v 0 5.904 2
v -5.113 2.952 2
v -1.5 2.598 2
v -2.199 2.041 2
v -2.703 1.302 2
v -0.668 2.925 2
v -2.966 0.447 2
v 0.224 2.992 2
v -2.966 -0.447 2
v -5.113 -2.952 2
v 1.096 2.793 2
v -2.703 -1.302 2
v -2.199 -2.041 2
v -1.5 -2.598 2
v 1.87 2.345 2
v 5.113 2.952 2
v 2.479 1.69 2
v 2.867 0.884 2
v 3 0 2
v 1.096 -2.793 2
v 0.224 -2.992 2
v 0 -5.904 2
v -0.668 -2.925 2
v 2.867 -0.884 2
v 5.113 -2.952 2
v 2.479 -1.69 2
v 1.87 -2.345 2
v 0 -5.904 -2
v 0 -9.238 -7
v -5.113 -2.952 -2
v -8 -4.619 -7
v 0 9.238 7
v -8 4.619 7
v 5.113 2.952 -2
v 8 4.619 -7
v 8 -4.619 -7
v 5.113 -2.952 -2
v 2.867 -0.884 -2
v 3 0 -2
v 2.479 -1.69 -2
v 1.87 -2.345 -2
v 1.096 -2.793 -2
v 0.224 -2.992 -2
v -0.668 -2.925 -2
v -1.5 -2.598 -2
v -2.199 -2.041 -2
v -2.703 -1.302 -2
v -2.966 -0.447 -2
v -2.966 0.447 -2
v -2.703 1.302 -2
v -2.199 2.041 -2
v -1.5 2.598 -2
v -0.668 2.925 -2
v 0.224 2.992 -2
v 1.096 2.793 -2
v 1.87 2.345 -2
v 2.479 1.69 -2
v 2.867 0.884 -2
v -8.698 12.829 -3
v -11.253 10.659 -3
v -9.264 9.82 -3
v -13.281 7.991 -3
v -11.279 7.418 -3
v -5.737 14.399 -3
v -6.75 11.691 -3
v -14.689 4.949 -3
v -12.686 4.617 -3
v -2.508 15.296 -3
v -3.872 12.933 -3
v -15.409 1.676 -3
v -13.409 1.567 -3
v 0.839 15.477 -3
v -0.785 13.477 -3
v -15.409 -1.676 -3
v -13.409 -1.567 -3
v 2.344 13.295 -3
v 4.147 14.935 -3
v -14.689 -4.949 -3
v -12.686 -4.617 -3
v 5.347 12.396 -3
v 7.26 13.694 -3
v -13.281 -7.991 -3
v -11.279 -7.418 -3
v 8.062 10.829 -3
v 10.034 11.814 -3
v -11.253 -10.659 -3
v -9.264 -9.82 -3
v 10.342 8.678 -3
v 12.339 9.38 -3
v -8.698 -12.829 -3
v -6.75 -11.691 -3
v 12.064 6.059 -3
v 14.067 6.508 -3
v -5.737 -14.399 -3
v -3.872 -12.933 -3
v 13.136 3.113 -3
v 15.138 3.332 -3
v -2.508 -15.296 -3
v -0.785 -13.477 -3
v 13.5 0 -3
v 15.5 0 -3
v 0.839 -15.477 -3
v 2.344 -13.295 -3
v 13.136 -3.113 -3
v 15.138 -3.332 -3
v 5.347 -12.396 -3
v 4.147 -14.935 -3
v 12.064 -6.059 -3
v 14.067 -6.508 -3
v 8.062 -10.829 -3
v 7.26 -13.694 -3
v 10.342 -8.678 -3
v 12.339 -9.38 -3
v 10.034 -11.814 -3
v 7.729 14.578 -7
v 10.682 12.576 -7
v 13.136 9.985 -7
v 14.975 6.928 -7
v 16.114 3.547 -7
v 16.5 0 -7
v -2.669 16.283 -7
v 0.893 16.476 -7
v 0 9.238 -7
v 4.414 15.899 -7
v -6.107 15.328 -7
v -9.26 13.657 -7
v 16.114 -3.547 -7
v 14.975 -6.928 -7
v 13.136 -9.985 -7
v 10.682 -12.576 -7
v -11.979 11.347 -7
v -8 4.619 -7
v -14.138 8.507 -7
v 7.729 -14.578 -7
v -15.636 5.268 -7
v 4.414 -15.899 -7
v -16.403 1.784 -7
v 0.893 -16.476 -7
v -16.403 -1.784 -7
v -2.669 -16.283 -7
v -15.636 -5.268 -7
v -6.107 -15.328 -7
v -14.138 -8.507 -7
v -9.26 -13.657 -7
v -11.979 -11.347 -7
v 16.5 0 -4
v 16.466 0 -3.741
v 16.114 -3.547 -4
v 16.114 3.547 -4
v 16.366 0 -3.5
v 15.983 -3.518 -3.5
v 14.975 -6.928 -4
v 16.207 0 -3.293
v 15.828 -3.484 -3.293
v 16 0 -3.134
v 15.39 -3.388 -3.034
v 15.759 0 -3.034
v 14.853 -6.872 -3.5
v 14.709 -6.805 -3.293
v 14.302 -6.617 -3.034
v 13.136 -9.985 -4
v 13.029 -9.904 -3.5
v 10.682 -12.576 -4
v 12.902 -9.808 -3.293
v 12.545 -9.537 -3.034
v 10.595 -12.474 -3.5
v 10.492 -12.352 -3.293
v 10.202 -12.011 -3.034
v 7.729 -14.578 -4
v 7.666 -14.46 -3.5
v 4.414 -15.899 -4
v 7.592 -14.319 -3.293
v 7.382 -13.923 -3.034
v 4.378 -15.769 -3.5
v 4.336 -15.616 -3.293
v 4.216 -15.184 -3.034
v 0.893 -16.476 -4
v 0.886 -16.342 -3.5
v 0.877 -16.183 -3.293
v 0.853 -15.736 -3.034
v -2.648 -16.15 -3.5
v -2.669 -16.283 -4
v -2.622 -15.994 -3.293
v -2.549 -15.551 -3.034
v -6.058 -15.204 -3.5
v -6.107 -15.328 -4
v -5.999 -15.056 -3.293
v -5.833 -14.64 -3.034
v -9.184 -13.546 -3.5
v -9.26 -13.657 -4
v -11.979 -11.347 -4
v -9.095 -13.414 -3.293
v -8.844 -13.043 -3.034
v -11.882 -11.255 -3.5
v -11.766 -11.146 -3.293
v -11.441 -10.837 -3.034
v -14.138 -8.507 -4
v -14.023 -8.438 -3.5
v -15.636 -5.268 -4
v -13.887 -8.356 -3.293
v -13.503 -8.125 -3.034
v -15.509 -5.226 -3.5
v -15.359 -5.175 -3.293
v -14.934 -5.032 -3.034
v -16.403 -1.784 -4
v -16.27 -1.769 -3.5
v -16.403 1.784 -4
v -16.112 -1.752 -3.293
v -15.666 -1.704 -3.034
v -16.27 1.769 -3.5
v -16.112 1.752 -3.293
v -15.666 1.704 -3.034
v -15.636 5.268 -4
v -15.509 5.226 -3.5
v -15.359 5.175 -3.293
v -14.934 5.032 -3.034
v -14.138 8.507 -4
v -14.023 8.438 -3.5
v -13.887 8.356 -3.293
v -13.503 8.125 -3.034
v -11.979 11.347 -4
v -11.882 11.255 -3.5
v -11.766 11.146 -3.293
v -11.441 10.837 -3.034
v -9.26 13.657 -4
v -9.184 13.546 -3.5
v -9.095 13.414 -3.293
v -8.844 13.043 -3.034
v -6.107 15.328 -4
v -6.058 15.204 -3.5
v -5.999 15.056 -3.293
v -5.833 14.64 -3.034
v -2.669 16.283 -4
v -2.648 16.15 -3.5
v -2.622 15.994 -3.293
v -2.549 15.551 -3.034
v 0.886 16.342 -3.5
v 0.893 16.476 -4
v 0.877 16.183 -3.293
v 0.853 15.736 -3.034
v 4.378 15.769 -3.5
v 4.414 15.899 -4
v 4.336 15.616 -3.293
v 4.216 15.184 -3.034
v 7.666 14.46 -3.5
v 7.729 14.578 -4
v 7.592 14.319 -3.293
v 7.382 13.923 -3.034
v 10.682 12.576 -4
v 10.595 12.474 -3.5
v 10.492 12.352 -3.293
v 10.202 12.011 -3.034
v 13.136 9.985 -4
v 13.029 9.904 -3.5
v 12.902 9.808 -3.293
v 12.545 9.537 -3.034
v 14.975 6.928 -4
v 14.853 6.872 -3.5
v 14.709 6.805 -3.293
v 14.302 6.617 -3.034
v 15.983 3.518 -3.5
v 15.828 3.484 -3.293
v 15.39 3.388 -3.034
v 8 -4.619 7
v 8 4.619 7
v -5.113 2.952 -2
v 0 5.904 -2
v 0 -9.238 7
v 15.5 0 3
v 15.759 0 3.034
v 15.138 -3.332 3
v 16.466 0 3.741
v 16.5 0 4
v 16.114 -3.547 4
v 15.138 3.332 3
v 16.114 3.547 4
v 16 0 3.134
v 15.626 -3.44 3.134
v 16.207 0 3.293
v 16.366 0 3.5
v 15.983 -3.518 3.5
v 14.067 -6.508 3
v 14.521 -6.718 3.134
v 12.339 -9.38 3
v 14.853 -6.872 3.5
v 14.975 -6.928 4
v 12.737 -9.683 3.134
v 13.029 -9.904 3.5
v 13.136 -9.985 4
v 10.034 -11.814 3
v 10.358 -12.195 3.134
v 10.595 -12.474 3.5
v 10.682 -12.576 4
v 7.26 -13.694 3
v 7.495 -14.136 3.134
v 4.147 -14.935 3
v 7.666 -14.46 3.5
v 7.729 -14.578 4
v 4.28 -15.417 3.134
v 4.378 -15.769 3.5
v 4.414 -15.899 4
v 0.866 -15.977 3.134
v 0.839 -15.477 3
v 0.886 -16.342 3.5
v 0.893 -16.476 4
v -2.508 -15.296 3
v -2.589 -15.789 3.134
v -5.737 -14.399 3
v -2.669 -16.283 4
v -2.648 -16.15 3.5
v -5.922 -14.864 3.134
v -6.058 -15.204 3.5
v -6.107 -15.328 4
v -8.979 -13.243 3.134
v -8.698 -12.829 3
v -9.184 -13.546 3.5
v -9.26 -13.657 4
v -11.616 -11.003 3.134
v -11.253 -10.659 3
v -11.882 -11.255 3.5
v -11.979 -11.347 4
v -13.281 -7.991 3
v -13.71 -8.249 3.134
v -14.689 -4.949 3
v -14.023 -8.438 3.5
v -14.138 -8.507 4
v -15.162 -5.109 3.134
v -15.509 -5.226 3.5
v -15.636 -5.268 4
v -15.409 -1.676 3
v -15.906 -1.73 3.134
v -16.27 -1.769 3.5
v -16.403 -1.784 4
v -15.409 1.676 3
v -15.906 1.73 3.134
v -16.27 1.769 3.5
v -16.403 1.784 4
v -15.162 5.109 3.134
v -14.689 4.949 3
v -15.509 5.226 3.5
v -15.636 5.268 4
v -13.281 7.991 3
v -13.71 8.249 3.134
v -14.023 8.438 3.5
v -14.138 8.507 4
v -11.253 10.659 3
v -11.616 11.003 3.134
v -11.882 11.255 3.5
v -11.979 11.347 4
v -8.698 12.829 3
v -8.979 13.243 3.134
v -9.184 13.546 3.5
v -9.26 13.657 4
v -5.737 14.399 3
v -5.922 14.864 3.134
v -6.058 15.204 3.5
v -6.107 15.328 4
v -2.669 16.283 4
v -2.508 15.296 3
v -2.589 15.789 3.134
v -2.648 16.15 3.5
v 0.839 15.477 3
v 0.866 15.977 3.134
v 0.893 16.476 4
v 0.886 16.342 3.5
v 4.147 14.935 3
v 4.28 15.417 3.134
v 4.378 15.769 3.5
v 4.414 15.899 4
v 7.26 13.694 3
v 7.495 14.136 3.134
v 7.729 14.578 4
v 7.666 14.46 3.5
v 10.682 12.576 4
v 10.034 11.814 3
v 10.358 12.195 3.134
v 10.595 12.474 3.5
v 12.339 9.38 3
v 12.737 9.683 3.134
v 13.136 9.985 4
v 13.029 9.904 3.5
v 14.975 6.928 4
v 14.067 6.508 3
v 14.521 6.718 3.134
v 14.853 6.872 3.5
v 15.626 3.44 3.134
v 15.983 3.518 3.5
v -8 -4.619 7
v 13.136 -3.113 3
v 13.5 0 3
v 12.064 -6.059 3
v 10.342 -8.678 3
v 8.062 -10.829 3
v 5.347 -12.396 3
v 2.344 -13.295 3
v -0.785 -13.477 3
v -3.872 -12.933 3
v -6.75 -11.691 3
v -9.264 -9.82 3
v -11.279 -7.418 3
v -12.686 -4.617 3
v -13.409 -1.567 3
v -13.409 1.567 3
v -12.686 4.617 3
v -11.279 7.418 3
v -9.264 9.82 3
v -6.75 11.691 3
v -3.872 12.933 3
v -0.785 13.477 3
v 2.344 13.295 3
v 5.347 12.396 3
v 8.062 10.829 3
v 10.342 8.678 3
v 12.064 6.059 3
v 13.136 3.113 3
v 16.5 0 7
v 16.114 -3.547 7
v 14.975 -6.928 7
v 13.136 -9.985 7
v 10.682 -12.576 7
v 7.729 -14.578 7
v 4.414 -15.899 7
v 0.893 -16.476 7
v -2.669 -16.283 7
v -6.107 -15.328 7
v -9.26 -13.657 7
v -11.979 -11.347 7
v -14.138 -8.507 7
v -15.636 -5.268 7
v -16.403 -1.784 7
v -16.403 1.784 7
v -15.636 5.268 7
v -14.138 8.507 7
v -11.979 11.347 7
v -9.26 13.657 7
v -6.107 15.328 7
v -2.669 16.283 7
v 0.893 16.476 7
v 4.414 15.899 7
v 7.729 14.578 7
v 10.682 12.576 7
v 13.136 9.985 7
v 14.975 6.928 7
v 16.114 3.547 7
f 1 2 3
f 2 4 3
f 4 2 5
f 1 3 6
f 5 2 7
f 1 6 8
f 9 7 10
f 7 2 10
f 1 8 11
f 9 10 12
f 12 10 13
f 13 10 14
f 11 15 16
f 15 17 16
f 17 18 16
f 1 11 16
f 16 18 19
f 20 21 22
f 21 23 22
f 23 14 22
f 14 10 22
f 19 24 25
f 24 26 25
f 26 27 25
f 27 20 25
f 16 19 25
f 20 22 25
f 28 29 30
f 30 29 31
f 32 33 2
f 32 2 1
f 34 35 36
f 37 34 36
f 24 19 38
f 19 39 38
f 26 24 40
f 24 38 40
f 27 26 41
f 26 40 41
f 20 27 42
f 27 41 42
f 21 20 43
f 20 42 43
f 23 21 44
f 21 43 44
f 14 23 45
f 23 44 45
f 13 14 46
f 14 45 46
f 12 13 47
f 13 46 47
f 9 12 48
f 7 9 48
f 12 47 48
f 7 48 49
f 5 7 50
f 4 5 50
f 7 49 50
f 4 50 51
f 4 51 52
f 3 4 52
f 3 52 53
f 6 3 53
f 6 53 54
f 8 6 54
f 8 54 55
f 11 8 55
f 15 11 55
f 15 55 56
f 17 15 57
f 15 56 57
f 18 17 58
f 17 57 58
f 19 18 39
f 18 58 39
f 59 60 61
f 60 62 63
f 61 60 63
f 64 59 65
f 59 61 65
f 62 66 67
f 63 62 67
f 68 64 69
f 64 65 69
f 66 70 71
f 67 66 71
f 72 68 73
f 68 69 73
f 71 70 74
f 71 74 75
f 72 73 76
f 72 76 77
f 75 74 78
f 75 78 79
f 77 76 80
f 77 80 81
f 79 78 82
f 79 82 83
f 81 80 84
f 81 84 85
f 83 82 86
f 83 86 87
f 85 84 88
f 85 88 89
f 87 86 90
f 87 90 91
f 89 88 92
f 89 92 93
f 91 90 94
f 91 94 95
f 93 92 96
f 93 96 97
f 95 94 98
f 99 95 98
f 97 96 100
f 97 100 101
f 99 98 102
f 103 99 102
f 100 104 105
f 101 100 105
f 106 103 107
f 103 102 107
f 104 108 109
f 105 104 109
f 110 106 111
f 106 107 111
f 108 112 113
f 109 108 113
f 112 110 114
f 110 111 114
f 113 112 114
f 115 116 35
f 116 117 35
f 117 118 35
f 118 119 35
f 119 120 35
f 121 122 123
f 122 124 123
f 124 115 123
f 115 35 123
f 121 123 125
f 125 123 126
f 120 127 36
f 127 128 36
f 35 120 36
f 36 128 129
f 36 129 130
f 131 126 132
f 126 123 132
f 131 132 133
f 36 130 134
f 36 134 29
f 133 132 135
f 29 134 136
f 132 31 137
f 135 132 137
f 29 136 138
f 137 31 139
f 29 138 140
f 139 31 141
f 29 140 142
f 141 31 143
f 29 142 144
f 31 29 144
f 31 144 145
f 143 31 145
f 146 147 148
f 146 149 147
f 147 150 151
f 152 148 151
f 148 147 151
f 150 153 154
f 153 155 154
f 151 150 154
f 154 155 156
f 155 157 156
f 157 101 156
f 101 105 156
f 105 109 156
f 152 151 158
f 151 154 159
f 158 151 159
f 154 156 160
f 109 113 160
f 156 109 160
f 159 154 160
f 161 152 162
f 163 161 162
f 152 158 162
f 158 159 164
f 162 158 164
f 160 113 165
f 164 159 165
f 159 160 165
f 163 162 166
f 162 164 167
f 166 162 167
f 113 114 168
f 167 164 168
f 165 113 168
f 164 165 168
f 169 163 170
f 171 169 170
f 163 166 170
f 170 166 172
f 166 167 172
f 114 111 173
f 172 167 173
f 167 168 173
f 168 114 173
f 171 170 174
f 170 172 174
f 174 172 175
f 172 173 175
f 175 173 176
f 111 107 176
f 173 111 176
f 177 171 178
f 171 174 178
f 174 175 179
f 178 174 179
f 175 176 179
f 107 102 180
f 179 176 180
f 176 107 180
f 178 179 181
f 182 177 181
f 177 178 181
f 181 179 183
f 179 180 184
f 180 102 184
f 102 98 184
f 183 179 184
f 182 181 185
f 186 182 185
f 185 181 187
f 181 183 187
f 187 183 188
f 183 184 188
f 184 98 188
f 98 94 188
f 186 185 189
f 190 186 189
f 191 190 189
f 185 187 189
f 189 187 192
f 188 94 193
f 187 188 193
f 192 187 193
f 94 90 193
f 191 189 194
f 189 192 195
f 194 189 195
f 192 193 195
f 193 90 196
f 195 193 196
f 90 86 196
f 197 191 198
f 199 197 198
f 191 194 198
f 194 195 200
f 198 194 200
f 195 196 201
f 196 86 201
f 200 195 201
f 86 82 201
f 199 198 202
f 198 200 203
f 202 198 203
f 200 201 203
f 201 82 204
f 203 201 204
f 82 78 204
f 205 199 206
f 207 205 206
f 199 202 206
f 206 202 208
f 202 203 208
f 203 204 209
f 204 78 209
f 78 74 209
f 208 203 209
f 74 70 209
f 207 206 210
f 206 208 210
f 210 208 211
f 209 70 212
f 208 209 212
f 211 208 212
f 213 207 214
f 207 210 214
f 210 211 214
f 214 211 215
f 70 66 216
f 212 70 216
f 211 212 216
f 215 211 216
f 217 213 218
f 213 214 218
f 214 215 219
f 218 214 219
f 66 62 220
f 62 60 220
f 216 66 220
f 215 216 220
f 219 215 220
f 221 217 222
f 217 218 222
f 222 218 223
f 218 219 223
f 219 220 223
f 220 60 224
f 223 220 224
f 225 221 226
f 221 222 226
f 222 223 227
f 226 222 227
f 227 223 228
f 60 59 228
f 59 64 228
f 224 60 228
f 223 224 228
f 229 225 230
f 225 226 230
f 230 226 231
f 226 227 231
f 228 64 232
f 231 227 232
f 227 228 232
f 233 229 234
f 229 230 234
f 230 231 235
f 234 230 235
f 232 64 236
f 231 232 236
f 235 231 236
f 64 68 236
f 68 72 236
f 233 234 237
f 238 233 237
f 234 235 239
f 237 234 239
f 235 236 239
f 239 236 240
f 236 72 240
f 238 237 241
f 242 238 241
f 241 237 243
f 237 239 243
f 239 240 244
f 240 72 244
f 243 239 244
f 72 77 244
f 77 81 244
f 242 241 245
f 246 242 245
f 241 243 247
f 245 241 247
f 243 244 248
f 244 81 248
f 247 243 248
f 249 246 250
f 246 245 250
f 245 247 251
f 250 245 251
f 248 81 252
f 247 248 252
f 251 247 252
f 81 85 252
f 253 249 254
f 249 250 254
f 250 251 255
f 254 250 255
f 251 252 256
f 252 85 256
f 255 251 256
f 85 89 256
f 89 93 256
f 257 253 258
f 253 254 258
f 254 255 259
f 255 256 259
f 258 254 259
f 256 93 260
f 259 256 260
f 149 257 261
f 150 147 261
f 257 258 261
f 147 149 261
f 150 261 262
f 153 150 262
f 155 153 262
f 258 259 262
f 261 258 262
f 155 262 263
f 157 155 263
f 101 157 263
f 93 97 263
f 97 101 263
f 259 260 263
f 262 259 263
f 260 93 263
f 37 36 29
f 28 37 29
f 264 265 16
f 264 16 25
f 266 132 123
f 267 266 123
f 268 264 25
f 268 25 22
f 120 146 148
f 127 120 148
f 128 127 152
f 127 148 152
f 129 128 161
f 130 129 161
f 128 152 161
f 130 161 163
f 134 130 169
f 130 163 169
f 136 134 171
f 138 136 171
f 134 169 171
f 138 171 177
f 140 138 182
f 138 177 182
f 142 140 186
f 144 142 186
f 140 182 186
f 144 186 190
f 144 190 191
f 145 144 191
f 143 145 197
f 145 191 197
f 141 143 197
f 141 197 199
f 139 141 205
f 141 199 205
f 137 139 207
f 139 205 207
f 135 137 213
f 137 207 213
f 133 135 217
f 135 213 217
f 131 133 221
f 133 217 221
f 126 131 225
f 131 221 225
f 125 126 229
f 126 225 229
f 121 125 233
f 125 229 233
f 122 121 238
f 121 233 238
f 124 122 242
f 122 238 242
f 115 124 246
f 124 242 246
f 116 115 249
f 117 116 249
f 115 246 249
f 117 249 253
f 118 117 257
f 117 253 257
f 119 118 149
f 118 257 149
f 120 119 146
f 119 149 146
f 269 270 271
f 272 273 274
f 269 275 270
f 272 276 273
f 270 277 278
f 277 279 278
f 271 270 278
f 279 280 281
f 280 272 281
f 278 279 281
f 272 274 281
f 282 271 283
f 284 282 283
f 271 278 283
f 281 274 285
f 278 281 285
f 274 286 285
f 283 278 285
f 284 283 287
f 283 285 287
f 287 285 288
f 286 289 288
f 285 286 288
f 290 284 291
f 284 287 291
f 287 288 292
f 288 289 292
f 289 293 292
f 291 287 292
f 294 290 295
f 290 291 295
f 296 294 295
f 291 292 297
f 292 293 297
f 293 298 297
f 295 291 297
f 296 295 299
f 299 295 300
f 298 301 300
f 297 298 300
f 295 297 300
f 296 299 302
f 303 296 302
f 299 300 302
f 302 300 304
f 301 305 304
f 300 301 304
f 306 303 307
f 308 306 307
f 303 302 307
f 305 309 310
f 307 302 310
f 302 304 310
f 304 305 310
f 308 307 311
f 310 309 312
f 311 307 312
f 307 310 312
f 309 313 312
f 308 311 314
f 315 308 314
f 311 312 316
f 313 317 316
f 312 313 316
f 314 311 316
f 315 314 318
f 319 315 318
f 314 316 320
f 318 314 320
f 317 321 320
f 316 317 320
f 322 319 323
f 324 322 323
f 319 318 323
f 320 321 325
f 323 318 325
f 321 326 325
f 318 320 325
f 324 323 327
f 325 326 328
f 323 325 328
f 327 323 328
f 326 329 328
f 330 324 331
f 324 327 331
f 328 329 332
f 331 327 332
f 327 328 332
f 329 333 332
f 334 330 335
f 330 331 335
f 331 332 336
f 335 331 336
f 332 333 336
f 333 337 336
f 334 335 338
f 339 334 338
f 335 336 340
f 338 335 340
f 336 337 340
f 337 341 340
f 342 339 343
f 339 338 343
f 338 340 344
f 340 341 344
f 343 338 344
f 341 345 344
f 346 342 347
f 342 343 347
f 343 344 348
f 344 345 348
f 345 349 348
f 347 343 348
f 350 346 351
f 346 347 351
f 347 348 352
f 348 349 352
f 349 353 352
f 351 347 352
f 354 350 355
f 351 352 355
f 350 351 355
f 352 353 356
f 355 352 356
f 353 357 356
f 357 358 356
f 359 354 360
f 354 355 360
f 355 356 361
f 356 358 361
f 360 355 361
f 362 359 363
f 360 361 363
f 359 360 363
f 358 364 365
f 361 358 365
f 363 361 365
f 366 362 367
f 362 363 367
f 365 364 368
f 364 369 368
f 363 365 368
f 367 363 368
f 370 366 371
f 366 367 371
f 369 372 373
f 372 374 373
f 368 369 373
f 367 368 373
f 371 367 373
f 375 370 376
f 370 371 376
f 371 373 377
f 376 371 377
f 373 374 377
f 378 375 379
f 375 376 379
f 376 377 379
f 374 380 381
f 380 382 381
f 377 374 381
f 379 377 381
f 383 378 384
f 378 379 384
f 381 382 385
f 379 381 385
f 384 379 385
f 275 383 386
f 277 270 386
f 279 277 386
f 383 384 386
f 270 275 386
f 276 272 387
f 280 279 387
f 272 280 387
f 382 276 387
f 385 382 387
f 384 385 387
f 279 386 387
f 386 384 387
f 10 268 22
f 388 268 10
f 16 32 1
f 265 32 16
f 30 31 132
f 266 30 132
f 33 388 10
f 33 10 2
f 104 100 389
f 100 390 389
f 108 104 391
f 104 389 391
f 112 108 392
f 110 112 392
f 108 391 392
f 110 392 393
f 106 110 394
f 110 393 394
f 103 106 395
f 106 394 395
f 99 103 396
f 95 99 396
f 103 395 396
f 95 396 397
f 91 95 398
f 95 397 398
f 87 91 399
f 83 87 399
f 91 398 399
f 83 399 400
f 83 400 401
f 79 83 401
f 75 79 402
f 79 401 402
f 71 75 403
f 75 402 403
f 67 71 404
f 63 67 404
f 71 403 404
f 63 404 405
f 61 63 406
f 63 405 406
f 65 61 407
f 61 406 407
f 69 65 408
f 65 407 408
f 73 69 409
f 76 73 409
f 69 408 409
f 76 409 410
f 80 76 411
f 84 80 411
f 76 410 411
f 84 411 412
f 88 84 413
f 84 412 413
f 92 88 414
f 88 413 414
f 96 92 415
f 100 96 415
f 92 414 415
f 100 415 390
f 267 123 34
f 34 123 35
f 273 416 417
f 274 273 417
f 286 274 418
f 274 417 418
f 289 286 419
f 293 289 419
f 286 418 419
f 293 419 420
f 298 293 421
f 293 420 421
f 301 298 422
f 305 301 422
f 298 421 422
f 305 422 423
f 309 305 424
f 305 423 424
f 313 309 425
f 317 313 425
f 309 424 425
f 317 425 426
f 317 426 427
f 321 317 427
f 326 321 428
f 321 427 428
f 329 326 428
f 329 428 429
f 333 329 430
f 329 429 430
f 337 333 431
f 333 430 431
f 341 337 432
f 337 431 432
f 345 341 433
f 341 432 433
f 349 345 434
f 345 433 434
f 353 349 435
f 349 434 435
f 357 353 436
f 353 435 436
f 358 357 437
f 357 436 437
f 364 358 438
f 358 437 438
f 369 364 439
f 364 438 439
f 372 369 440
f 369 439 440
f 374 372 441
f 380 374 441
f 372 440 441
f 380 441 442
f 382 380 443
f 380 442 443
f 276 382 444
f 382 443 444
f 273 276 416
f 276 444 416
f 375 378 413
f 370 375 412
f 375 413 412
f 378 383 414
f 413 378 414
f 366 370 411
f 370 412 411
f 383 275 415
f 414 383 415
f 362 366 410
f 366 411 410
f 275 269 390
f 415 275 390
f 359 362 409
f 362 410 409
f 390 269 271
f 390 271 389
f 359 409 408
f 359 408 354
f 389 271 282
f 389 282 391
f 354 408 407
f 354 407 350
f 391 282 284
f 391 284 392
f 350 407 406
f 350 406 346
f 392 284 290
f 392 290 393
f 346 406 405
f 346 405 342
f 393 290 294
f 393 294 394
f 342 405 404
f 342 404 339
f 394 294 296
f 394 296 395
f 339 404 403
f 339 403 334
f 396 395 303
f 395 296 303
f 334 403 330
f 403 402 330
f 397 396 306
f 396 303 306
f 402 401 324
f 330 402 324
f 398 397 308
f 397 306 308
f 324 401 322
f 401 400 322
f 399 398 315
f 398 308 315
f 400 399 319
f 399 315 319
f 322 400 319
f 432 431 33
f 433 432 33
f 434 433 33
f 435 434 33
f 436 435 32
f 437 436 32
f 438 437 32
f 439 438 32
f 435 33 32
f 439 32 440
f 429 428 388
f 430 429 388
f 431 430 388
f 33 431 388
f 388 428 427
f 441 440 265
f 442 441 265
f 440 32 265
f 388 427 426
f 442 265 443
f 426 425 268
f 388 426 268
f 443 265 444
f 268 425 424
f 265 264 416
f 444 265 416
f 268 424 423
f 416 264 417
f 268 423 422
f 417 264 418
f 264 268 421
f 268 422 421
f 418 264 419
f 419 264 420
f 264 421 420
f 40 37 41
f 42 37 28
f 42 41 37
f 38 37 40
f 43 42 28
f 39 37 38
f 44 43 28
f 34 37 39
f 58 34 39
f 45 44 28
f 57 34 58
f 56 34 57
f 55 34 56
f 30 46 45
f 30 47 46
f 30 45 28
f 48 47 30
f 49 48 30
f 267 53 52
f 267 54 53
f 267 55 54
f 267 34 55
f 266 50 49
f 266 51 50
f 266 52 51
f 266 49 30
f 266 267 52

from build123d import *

# Parameters (mm, degrees)
FILLET2_R            = 1
CUT_EXTRUDE2_DEPTH   = 5
CUT_EXTRUDE2_DRAFT   = -30
MIRROR1_COPY_1_DEPTH = 5
MIRROR1_COPY_1_DRAFT = -30


with BuildPart() as part:
    # Sketch2 → Revolve1 (revolve)
    with BuildSketch(Plane(origin=(0, 0, 0), x_dir=(0, 0, -1), z_dir=(1, 0, 0)), mode=Mode.PRIVATE) as revolve1_sk:
        Polygon((-7, 16.5), (-7, 3), (0, 3), (0, 13.5), (-3, 13.5), (-3, 16.5), align=None)
        Polygon((0, 13.5), (0, 3), (7, 3), (7, 16.5), (3, 16.5), (3, 13.5), align=None)
    revolve(revolve1_sk.sketch.rotate(Axis((0, 0, 0), (0, 0, -1)), 90), axis=Axis((0, 0, 0), (0, 0, -1)))

    # Fillet2
    fillet2_edges = [part.edges().sort_by_distance(p)[0] for p in [
        (-16.5, 0, -3),
        (-16.5, 0, 3),
    ]]
    fillet(fillet2_edges, radius=FILLET2_R)


with BuildPart() as cut_extrude2_tool:
    # Sketch5 → Cut-Extrude2 (with draft: the straight prism first)
    with BuildSketch(Plane(origin=(0, 0, -7), x_dir=(-1, 0, 0), z_dir=(0, 0, -1))):
        Polygon((0, 9.237604307), (-8, 4.618802154), (-8, -4.618802154), (0, -9.237604307), (8, -4.618802154), (8, 4.618802154), align=None)
    extrude(amount=-CUT_EXTRUDE2_DEPTH)
    # Cut-Extrude2: the draft: its side faces are tilted about the plane it starts from
    cut_extrude2_sides = [cut_extrude2_tool.faces().sort_by_distance(p)[0] for p in [
        (4, 6.92820323, -4.5),
        (8, 0, -4.5),
        (4, -6.92820323, -4.5),
        (-4, -6.92820323, -4.5),
        (-8, 0, -4.5),
        (-4, 6.92820323, -4.5),
    ]]
    draft(cut_extrude2_sides, Plane(origin=(0, 0, -7), x_dir=(-1, 0, 0), z_dir=(0, 0, -1)), CUT_EXTRUDE2_DRAFT)


with BuildPart() as part_1:
    add(part.part)

    # Cut-Extrude2: cut by cut_extrude2_tool
    add(cut_extrude2_tool.part, mode=Mode.SUBTRACT)


with BuildPart() as mirror1_copy_1_tool:
    # Mirror1 copy 1 sketch → Mirror1 copy 1 (with draft: the straight prism first)
    with BuildSketch(Plane(origin=(0, 0, 7), x_dir=(-1, 0, 0), z_dir=(0, 0, 1))):
        Polygon((0, -9.237604307), (-8, -4.618802154), (-8, 4.618802154), (0, 9.237604307), (8, 4.618802154), (8, -4.618802154), align=None)
    extrude(amount=-MIRROR1_COPY_1_DEPTH)
    # Mirror1 copy 1: the draft: its side faces are tilted about the plane it starts from
    mirror1_copy_1_sides = [mirror1_copy_1_tool.faces().sort_by_distance(p)[0] for p in [
        (4, 6.92820323, 4.5),
        (8, 0, 4.5),
        (4, -6.92820323, 4.5),
        (-4, -6.92820323, 4.5),
        (-8, 0, 4.5),
        (-4, 6.92820323, 4.5),
    ]]
    draft(mirror1_copy_1_sides, Plane(origin=(0, 0, 7), x_dir=(-1, 0, 0), z_dir=(0, 0, 1)), MIRROR1_COPY_1_DRAFT)


with BuildPart() as part_2:
    add(part_1.part)

    # Mirror1 copy 1: cut by mirror1_copy_1_tool
    add(mirror1_copy_1_tool.part, mode=Mode.SUBTRACT)


solid = part_2.part
